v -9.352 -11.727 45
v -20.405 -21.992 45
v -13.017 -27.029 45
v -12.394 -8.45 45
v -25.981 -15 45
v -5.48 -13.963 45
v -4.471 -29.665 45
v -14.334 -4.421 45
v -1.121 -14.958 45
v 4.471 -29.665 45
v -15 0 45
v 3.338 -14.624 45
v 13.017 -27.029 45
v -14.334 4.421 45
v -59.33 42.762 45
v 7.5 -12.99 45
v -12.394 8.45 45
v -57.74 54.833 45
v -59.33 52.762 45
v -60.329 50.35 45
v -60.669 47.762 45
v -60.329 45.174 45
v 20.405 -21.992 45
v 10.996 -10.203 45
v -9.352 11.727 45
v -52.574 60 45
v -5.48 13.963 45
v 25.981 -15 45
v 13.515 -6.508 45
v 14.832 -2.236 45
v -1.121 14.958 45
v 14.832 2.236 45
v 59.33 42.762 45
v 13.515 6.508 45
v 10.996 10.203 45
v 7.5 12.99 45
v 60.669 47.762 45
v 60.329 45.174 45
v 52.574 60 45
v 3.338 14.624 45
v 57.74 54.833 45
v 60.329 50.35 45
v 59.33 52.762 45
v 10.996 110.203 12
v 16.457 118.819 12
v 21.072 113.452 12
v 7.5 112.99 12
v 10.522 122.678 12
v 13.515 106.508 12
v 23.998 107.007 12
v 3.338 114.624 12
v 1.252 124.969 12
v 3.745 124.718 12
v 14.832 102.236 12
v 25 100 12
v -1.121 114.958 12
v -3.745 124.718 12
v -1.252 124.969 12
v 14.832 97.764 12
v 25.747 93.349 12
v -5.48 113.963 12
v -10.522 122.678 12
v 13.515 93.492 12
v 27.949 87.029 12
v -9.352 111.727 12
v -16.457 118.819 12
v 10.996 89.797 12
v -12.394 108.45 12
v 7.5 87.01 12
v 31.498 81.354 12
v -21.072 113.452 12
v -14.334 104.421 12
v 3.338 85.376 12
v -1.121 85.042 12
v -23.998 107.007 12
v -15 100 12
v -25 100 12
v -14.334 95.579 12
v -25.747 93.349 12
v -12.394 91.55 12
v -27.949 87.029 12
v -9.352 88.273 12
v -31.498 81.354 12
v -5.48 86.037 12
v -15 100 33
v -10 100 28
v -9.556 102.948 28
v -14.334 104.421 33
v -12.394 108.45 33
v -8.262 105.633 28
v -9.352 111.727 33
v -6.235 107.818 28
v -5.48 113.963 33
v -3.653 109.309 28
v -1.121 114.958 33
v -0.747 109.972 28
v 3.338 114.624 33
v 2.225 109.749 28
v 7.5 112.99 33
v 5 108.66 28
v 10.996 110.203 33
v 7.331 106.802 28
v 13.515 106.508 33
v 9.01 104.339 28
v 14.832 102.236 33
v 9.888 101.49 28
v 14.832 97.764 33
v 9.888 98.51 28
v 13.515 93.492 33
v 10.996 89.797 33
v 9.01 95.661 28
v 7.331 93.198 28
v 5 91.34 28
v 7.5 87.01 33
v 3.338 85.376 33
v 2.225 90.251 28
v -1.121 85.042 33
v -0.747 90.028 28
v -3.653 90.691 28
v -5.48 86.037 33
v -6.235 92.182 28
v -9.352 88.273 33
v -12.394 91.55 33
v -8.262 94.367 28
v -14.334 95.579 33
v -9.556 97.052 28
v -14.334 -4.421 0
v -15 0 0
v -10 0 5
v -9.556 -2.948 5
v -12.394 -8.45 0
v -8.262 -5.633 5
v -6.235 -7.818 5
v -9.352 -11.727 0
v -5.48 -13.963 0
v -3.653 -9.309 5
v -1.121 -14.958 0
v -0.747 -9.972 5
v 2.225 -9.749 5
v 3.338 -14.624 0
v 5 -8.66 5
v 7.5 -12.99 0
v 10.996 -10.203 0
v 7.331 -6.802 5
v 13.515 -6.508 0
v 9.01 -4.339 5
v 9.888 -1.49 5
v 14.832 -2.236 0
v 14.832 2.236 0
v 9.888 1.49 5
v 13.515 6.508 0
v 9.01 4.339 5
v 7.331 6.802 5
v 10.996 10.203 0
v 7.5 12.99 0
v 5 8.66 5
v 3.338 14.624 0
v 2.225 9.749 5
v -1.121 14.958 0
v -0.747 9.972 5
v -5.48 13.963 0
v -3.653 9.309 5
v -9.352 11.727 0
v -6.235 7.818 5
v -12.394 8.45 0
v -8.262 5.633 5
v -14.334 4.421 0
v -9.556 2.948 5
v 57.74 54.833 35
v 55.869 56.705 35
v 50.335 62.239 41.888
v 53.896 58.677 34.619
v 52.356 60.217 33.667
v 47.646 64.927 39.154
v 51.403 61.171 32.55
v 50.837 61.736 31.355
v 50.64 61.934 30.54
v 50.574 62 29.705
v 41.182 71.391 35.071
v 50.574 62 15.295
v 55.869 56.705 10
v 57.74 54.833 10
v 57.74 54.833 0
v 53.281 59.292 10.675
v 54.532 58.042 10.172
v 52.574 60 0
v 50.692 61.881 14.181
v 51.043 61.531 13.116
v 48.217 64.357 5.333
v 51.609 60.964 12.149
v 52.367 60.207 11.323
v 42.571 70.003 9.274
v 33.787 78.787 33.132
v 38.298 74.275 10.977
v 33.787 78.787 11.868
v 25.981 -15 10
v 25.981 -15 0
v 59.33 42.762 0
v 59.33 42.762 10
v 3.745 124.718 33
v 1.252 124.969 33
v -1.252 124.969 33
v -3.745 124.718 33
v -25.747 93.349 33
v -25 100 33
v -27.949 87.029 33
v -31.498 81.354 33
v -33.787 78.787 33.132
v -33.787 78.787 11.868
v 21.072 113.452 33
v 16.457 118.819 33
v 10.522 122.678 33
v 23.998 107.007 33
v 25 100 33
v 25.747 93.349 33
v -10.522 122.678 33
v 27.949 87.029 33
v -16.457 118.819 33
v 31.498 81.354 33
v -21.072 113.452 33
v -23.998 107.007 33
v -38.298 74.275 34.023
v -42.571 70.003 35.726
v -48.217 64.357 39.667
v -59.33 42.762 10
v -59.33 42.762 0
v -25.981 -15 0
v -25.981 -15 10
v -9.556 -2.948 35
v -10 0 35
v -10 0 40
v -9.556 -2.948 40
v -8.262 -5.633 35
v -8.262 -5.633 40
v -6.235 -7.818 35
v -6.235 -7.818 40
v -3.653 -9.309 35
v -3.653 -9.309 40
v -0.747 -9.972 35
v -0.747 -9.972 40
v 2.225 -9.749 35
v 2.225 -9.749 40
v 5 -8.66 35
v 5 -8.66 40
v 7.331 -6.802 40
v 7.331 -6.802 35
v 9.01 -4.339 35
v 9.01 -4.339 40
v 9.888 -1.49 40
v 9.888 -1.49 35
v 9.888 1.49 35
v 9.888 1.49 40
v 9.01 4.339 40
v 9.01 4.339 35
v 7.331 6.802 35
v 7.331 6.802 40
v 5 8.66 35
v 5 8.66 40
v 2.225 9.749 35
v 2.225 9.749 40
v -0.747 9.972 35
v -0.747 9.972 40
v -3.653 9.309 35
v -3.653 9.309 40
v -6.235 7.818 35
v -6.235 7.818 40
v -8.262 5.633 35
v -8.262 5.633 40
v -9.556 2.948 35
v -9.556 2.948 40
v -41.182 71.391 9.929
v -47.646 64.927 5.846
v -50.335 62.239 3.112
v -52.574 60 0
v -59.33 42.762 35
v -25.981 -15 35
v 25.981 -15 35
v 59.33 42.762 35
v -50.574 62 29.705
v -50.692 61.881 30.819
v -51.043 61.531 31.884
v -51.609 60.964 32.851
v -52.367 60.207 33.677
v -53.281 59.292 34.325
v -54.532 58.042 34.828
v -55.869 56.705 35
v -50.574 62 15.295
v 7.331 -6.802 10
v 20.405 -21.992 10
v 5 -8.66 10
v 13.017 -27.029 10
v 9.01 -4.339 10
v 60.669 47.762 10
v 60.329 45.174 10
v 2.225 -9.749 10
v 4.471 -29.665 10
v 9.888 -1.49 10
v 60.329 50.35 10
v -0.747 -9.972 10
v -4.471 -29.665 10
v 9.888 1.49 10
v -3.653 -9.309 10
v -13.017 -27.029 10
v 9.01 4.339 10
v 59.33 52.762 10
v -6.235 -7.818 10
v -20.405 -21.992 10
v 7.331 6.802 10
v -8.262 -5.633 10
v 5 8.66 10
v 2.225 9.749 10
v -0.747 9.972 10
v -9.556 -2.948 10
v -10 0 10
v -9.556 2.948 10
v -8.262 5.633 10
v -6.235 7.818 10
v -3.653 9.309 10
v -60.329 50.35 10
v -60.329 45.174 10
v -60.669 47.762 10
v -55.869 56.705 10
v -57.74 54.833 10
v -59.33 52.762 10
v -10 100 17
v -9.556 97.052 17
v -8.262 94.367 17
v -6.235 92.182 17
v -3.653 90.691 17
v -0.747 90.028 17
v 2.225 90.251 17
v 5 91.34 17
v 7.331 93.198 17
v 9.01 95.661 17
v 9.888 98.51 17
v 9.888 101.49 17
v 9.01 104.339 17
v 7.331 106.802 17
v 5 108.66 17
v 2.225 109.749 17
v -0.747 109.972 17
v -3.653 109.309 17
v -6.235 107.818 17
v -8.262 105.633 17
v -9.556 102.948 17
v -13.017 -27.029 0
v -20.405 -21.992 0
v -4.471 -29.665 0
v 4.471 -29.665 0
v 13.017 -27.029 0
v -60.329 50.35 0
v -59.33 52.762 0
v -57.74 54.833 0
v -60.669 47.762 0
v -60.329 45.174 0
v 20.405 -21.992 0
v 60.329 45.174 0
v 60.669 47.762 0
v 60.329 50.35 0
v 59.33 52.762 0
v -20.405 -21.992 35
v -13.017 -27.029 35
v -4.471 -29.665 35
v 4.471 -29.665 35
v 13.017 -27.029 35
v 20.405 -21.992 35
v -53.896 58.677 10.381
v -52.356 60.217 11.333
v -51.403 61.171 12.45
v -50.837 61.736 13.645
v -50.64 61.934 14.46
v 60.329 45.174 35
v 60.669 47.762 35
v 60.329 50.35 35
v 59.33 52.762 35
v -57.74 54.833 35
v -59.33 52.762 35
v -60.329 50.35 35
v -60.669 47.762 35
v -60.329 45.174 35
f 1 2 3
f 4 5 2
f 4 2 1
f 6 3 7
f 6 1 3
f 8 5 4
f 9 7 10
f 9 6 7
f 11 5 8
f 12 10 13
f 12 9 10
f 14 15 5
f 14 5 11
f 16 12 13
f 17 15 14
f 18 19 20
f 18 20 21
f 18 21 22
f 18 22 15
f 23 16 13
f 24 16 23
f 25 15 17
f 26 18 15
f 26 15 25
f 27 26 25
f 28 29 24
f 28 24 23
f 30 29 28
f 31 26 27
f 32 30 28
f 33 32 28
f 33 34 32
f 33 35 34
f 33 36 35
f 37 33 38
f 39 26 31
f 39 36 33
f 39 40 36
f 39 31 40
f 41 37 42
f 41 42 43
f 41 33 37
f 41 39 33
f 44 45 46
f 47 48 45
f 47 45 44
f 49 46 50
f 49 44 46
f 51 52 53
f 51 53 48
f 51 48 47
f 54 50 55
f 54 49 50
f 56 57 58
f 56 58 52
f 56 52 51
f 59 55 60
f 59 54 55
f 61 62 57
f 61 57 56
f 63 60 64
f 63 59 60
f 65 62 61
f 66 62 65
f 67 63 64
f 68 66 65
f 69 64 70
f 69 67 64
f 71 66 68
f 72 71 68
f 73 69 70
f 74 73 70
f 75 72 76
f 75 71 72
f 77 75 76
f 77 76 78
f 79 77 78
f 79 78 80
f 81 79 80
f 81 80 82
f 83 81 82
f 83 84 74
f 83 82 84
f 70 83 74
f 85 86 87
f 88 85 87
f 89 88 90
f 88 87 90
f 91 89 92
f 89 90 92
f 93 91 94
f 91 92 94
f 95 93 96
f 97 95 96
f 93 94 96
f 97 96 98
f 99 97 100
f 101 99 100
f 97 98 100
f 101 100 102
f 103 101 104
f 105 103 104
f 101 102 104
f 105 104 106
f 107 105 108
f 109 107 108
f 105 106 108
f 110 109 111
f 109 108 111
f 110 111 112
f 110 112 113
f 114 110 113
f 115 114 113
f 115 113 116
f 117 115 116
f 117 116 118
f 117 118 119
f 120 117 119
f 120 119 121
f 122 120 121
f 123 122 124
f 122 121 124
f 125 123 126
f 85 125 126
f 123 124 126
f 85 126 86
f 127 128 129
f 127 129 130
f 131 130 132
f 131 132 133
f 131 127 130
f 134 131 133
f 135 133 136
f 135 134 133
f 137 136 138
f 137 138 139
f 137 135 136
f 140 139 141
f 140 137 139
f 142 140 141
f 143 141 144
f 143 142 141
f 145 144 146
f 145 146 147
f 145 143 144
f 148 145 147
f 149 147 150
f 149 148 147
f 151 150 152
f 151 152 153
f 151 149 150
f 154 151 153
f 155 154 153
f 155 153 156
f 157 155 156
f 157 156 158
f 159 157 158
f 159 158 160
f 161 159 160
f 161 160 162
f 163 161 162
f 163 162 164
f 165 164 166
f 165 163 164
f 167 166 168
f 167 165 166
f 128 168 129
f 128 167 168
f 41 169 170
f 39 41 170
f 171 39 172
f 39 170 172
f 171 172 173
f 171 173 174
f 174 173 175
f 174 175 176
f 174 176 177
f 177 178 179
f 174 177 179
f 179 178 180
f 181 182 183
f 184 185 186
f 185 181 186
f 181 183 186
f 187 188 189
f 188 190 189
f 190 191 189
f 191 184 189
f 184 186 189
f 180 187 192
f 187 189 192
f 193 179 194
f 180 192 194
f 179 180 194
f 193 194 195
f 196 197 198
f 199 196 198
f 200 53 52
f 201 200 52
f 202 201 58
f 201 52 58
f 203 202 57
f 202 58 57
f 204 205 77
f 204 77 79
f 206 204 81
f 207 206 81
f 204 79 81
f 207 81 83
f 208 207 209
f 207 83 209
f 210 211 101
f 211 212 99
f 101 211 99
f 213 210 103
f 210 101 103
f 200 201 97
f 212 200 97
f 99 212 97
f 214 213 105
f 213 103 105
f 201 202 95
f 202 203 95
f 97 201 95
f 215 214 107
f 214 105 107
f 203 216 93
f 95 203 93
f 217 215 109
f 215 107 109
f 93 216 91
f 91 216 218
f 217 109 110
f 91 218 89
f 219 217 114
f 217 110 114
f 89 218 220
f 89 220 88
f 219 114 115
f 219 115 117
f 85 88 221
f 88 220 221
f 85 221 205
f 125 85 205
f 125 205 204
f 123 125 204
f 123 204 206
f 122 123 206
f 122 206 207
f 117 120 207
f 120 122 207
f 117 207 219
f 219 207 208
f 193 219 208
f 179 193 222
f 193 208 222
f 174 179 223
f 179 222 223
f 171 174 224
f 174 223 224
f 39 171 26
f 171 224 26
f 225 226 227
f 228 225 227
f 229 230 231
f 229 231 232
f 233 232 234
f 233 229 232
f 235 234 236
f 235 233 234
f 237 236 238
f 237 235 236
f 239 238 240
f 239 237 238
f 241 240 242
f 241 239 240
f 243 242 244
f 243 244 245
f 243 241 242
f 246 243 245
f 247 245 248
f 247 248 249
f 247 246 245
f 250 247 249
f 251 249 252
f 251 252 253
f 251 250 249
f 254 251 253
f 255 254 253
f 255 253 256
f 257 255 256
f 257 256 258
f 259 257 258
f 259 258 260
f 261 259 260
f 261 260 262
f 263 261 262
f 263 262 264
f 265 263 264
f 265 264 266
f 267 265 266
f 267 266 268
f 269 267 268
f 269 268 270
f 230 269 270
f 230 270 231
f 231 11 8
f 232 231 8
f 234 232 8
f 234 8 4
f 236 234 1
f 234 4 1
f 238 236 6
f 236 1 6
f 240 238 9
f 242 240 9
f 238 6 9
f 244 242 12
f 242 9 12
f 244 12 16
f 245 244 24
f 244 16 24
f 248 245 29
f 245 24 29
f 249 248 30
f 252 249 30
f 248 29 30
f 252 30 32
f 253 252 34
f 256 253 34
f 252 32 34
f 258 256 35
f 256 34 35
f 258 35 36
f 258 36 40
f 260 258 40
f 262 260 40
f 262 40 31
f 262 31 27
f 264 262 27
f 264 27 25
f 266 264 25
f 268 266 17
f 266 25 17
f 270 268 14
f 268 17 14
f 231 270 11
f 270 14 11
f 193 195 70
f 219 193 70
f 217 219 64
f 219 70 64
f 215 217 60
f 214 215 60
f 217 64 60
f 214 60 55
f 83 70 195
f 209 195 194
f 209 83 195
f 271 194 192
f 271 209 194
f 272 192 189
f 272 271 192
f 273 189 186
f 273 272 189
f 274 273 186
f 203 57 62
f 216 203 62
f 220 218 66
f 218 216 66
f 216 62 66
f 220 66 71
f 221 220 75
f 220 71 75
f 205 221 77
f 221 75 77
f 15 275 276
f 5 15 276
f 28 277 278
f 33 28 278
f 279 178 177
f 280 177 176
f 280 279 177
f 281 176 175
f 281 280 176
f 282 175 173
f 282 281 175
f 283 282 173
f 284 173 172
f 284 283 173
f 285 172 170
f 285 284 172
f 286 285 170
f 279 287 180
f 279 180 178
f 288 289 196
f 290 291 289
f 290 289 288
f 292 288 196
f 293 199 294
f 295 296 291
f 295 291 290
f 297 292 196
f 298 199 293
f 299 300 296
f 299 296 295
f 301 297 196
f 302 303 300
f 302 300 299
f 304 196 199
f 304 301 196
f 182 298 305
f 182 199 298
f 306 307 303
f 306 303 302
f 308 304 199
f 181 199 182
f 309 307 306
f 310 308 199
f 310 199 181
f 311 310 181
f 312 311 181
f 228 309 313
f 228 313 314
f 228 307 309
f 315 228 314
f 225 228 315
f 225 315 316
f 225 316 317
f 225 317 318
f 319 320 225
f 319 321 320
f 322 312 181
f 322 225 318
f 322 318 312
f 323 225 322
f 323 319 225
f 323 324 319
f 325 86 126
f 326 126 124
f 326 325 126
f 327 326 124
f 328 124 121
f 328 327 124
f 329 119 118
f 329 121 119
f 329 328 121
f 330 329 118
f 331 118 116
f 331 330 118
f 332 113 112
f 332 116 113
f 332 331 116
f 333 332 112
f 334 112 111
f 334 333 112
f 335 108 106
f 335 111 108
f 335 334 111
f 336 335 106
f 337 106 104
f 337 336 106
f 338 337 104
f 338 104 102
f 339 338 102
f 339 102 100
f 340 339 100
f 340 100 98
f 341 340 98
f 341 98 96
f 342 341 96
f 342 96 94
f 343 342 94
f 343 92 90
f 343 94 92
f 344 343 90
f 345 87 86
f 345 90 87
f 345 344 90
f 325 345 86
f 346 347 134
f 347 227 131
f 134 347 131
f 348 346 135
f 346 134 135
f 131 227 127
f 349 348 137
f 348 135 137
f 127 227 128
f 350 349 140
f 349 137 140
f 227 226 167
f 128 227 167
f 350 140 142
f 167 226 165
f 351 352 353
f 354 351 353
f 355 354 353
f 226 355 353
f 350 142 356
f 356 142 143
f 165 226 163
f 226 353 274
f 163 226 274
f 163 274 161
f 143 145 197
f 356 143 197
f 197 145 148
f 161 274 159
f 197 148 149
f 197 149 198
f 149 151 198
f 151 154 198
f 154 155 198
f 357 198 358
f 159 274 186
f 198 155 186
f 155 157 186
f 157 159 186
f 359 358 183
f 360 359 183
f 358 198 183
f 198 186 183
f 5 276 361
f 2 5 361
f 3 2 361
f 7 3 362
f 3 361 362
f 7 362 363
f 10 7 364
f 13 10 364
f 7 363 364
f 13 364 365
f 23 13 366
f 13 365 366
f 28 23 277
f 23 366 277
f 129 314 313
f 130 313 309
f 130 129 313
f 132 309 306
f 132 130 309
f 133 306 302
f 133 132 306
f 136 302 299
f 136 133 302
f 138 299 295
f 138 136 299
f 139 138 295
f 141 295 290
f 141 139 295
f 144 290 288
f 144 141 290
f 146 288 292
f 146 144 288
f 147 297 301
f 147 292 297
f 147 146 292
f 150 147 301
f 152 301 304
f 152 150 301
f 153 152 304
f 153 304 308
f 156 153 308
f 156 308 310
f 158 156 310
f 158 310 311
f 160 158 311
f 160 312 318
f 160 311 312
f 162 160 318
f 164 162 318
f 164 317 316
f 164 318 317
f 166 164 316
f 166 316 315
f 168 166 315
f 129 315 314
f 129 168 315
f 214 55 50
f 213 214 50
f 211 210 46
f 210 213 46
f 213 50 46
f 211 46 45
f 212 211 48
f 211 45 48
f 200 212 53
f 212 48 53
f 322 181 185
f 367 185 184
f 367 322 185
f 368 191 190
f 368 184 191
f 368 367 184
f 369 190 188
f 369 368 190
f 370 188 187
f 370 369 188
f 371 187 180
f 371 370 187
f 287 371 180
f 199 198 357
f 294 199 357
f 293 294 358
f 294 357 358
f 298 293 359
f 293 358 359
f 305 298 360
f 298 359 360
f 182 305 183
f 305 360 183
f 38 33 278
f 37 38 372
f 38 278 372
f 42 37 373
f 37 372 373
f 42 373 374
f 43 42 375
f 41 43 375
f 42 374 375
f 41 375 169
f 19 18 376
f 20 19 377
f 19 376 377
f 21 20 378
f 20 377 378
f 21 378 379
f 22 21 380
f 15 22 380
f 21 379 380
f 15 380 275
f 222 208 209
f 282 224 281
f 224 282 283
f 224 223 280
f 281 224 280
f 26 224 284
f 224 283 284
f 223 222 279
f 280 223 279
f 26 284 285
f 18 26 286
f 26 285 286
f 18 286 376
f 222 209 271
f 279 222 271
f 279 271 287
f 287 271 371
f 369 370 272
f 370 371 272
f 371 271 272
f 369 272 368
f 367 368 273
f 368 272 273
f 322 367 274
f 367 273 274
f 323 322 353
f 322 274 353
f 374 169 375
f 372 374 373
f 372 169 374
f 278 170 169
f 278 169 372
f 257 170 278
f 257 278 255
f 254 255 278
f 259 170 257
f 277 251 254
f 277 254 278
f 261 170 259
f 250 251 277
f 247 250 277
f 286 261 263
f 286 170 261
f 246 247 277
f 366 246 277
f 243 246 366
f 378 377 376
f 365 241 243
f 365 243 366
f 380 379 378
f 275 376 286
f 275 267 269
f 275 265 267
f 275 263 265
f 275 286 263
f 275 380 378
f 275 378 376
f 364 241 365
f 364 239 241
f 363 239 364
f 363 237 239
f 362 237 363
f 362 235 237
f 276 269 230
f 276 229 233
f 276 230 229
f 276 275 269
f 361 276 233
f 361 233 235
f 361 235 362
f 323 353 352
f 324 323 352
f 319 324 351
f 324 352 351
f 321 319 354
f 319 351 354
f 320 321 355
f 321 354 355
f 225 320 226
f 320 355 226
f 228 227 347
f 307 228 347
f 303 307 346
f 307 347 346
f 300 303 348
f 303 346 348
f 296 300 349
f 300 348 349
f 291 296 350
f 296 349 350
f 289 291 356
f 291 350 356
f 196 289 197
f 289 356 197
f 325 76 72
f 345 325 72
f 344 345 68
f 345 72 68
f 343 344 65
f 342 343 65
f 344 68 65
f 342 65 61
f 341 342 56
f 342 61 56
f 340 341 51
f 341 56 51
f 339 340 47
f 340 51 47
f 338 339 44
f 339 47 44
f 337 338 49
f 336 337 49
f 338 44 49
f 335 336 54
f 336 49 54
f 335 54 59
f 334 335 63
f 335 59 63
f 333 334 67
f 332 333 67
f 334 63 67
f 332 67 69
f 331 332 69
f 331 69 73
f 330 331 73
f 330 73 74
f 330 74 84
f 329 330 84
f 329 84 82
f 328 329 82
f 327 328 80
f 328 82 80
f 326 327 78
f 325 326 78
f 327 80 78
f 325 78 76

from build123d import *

# Parameters (mm, degrees)
SKETCH2_R               = 10
BOSS_EXTRUDE1_DEPTH     = 45
CUT_EXTRUDE2_DEPTH      = 147.050606819
CUT_EXTRUDE2_DEPTH_BACK = 147.050606819
CHAMFER1_SIZE           = 5


with BuildPart() as part:
    # Sketch2 → Boss-Extrude1 (new body)
    with BuildSketch(Plane.XY):
        with BuildLine():
            ThreePointArc((-25.980762114, -15), (0, -30), (25.980762114, -15))
            Line((25.980762114, -15), (59.329684168, 42.762027375))
            ThreePointArc((59.329684168, 42.762027375), (60.583878744, 49.067289298), (57.740497942, 54.833095187))
            Line((57.740497942, 54.833095187), (33.786796564, 78.786796564))
            ThreePointArc((33.786796564, 78.786796564), (27.283614025, 88.519497029), (25, 100))
            ThreePointArc((25, 100), (18.955379316, 116.300110275), (3.744512401, 124.717981853))
            ThreePointArc((3.744512401, 124.717981853), (0, 125), (-3.744512401, 124.717981853))
            ThreePointArc((-3.744512401, 124.717981853), (-18.955379316, 116.300110275), (-25, 100))
            ThreePointArc((-25, 100), (-27.283614025, 88.519497029), (-33.786796564, 78.786796564))
            Line((-33.786796564, 78.786796564), (-57.740497942, 54.833095187))
            ThreePointArc((-57.740497942, 54.833095187), (-60.583878744, 49.067289298), (-59.329684168, 42.762027375))
            Line((-59.329684168, 42.762027375), (-25.980762114, -15))
        make_face()
        with Locations(Location((0, 0, 0), (0, 0, 180))):
            Circle(SKETCH2_R, mode=Mode.SUBTRACT)
        with Locations(Location((0, 100, 0), (0, 0, 180))):
            Circle(SKETCH2_R, mode=Mode.SUBTRACT)
    extrude(amount=BOSS_EXTRUDE1_DEPTH)

    # Sketch3 → Cut-Extrude2 (cut, two sides: drawn at the far end of the back side and taken through both)
    with BuildSketch(Plane(origin=(0, 0, 0), x_dir=(0, 0, -1), z_dir=(1, 0, 0)).offset(-CUT_EXTRUDE2_DEPTH_BACK)):
        with BuildLine():
            Line((-12, 125), (-12, 81.354156504))
            ThreePointArc((-12, 81.354156504), (-8.794494718, 69.10670779), (0, 60))
            Line((0, 60), (0, 125))
            Line((0, 125), (-12, 125))
        make_face()
        with BuildLine():
            Line((-35, -30), (-22.5, -30))
            Line((-22.5, -30), (-22.5, 62))
            Line((-22.5, 62), (-29.704718934, 62))
            ThreePointArc((-29.704718934, 62), (-33.449048084, 60.449048084), (-35, 56.704718934))
            Line((-35, 56.704718934), (-35, -30))
        make_face()
        with BuildLine():
            Line((-22.5, -30), (-10, -30))
            Line((-10, -30), (-10, 56.704718934))
            ThreePointArc((-10, 56.704718934), (-11.550951916, 60.449048084), (-15.295281066, 62))
            Line((-15.295281066, 62), (-22.5, 62))
            Line((-22.5, 62), (-22.5, -30))
        make_face()
        with BuildLine():
            Line((-33, 125), (-33, 81.354156504))
            ThreePointArc((-33, 81.354156504), (-36.205505282, 69.10670779), (-45, 60))
            Line((-45, 60), (-45, 125))
            Line((-45, 125), (-33, 125))
        make_face()
    extrude(amount=CUT_EXTRUDE2_DEPTH + CUT_EXTRUDE2_DEPTH_BACK, mode=Mode.SUBTRACT)

    # Chamfer1
    chamfer1_edges = [part.edges().sort_by_distance(p)[0] for p in [
        (10, 100, 12),
        (10, 0, 0),
        (10, 0, 45),
        (10, 100, 33),
    ]]
    chamfer(chamfer1_edges, length=CHAMFER1_SIZE)


solid = part.part
